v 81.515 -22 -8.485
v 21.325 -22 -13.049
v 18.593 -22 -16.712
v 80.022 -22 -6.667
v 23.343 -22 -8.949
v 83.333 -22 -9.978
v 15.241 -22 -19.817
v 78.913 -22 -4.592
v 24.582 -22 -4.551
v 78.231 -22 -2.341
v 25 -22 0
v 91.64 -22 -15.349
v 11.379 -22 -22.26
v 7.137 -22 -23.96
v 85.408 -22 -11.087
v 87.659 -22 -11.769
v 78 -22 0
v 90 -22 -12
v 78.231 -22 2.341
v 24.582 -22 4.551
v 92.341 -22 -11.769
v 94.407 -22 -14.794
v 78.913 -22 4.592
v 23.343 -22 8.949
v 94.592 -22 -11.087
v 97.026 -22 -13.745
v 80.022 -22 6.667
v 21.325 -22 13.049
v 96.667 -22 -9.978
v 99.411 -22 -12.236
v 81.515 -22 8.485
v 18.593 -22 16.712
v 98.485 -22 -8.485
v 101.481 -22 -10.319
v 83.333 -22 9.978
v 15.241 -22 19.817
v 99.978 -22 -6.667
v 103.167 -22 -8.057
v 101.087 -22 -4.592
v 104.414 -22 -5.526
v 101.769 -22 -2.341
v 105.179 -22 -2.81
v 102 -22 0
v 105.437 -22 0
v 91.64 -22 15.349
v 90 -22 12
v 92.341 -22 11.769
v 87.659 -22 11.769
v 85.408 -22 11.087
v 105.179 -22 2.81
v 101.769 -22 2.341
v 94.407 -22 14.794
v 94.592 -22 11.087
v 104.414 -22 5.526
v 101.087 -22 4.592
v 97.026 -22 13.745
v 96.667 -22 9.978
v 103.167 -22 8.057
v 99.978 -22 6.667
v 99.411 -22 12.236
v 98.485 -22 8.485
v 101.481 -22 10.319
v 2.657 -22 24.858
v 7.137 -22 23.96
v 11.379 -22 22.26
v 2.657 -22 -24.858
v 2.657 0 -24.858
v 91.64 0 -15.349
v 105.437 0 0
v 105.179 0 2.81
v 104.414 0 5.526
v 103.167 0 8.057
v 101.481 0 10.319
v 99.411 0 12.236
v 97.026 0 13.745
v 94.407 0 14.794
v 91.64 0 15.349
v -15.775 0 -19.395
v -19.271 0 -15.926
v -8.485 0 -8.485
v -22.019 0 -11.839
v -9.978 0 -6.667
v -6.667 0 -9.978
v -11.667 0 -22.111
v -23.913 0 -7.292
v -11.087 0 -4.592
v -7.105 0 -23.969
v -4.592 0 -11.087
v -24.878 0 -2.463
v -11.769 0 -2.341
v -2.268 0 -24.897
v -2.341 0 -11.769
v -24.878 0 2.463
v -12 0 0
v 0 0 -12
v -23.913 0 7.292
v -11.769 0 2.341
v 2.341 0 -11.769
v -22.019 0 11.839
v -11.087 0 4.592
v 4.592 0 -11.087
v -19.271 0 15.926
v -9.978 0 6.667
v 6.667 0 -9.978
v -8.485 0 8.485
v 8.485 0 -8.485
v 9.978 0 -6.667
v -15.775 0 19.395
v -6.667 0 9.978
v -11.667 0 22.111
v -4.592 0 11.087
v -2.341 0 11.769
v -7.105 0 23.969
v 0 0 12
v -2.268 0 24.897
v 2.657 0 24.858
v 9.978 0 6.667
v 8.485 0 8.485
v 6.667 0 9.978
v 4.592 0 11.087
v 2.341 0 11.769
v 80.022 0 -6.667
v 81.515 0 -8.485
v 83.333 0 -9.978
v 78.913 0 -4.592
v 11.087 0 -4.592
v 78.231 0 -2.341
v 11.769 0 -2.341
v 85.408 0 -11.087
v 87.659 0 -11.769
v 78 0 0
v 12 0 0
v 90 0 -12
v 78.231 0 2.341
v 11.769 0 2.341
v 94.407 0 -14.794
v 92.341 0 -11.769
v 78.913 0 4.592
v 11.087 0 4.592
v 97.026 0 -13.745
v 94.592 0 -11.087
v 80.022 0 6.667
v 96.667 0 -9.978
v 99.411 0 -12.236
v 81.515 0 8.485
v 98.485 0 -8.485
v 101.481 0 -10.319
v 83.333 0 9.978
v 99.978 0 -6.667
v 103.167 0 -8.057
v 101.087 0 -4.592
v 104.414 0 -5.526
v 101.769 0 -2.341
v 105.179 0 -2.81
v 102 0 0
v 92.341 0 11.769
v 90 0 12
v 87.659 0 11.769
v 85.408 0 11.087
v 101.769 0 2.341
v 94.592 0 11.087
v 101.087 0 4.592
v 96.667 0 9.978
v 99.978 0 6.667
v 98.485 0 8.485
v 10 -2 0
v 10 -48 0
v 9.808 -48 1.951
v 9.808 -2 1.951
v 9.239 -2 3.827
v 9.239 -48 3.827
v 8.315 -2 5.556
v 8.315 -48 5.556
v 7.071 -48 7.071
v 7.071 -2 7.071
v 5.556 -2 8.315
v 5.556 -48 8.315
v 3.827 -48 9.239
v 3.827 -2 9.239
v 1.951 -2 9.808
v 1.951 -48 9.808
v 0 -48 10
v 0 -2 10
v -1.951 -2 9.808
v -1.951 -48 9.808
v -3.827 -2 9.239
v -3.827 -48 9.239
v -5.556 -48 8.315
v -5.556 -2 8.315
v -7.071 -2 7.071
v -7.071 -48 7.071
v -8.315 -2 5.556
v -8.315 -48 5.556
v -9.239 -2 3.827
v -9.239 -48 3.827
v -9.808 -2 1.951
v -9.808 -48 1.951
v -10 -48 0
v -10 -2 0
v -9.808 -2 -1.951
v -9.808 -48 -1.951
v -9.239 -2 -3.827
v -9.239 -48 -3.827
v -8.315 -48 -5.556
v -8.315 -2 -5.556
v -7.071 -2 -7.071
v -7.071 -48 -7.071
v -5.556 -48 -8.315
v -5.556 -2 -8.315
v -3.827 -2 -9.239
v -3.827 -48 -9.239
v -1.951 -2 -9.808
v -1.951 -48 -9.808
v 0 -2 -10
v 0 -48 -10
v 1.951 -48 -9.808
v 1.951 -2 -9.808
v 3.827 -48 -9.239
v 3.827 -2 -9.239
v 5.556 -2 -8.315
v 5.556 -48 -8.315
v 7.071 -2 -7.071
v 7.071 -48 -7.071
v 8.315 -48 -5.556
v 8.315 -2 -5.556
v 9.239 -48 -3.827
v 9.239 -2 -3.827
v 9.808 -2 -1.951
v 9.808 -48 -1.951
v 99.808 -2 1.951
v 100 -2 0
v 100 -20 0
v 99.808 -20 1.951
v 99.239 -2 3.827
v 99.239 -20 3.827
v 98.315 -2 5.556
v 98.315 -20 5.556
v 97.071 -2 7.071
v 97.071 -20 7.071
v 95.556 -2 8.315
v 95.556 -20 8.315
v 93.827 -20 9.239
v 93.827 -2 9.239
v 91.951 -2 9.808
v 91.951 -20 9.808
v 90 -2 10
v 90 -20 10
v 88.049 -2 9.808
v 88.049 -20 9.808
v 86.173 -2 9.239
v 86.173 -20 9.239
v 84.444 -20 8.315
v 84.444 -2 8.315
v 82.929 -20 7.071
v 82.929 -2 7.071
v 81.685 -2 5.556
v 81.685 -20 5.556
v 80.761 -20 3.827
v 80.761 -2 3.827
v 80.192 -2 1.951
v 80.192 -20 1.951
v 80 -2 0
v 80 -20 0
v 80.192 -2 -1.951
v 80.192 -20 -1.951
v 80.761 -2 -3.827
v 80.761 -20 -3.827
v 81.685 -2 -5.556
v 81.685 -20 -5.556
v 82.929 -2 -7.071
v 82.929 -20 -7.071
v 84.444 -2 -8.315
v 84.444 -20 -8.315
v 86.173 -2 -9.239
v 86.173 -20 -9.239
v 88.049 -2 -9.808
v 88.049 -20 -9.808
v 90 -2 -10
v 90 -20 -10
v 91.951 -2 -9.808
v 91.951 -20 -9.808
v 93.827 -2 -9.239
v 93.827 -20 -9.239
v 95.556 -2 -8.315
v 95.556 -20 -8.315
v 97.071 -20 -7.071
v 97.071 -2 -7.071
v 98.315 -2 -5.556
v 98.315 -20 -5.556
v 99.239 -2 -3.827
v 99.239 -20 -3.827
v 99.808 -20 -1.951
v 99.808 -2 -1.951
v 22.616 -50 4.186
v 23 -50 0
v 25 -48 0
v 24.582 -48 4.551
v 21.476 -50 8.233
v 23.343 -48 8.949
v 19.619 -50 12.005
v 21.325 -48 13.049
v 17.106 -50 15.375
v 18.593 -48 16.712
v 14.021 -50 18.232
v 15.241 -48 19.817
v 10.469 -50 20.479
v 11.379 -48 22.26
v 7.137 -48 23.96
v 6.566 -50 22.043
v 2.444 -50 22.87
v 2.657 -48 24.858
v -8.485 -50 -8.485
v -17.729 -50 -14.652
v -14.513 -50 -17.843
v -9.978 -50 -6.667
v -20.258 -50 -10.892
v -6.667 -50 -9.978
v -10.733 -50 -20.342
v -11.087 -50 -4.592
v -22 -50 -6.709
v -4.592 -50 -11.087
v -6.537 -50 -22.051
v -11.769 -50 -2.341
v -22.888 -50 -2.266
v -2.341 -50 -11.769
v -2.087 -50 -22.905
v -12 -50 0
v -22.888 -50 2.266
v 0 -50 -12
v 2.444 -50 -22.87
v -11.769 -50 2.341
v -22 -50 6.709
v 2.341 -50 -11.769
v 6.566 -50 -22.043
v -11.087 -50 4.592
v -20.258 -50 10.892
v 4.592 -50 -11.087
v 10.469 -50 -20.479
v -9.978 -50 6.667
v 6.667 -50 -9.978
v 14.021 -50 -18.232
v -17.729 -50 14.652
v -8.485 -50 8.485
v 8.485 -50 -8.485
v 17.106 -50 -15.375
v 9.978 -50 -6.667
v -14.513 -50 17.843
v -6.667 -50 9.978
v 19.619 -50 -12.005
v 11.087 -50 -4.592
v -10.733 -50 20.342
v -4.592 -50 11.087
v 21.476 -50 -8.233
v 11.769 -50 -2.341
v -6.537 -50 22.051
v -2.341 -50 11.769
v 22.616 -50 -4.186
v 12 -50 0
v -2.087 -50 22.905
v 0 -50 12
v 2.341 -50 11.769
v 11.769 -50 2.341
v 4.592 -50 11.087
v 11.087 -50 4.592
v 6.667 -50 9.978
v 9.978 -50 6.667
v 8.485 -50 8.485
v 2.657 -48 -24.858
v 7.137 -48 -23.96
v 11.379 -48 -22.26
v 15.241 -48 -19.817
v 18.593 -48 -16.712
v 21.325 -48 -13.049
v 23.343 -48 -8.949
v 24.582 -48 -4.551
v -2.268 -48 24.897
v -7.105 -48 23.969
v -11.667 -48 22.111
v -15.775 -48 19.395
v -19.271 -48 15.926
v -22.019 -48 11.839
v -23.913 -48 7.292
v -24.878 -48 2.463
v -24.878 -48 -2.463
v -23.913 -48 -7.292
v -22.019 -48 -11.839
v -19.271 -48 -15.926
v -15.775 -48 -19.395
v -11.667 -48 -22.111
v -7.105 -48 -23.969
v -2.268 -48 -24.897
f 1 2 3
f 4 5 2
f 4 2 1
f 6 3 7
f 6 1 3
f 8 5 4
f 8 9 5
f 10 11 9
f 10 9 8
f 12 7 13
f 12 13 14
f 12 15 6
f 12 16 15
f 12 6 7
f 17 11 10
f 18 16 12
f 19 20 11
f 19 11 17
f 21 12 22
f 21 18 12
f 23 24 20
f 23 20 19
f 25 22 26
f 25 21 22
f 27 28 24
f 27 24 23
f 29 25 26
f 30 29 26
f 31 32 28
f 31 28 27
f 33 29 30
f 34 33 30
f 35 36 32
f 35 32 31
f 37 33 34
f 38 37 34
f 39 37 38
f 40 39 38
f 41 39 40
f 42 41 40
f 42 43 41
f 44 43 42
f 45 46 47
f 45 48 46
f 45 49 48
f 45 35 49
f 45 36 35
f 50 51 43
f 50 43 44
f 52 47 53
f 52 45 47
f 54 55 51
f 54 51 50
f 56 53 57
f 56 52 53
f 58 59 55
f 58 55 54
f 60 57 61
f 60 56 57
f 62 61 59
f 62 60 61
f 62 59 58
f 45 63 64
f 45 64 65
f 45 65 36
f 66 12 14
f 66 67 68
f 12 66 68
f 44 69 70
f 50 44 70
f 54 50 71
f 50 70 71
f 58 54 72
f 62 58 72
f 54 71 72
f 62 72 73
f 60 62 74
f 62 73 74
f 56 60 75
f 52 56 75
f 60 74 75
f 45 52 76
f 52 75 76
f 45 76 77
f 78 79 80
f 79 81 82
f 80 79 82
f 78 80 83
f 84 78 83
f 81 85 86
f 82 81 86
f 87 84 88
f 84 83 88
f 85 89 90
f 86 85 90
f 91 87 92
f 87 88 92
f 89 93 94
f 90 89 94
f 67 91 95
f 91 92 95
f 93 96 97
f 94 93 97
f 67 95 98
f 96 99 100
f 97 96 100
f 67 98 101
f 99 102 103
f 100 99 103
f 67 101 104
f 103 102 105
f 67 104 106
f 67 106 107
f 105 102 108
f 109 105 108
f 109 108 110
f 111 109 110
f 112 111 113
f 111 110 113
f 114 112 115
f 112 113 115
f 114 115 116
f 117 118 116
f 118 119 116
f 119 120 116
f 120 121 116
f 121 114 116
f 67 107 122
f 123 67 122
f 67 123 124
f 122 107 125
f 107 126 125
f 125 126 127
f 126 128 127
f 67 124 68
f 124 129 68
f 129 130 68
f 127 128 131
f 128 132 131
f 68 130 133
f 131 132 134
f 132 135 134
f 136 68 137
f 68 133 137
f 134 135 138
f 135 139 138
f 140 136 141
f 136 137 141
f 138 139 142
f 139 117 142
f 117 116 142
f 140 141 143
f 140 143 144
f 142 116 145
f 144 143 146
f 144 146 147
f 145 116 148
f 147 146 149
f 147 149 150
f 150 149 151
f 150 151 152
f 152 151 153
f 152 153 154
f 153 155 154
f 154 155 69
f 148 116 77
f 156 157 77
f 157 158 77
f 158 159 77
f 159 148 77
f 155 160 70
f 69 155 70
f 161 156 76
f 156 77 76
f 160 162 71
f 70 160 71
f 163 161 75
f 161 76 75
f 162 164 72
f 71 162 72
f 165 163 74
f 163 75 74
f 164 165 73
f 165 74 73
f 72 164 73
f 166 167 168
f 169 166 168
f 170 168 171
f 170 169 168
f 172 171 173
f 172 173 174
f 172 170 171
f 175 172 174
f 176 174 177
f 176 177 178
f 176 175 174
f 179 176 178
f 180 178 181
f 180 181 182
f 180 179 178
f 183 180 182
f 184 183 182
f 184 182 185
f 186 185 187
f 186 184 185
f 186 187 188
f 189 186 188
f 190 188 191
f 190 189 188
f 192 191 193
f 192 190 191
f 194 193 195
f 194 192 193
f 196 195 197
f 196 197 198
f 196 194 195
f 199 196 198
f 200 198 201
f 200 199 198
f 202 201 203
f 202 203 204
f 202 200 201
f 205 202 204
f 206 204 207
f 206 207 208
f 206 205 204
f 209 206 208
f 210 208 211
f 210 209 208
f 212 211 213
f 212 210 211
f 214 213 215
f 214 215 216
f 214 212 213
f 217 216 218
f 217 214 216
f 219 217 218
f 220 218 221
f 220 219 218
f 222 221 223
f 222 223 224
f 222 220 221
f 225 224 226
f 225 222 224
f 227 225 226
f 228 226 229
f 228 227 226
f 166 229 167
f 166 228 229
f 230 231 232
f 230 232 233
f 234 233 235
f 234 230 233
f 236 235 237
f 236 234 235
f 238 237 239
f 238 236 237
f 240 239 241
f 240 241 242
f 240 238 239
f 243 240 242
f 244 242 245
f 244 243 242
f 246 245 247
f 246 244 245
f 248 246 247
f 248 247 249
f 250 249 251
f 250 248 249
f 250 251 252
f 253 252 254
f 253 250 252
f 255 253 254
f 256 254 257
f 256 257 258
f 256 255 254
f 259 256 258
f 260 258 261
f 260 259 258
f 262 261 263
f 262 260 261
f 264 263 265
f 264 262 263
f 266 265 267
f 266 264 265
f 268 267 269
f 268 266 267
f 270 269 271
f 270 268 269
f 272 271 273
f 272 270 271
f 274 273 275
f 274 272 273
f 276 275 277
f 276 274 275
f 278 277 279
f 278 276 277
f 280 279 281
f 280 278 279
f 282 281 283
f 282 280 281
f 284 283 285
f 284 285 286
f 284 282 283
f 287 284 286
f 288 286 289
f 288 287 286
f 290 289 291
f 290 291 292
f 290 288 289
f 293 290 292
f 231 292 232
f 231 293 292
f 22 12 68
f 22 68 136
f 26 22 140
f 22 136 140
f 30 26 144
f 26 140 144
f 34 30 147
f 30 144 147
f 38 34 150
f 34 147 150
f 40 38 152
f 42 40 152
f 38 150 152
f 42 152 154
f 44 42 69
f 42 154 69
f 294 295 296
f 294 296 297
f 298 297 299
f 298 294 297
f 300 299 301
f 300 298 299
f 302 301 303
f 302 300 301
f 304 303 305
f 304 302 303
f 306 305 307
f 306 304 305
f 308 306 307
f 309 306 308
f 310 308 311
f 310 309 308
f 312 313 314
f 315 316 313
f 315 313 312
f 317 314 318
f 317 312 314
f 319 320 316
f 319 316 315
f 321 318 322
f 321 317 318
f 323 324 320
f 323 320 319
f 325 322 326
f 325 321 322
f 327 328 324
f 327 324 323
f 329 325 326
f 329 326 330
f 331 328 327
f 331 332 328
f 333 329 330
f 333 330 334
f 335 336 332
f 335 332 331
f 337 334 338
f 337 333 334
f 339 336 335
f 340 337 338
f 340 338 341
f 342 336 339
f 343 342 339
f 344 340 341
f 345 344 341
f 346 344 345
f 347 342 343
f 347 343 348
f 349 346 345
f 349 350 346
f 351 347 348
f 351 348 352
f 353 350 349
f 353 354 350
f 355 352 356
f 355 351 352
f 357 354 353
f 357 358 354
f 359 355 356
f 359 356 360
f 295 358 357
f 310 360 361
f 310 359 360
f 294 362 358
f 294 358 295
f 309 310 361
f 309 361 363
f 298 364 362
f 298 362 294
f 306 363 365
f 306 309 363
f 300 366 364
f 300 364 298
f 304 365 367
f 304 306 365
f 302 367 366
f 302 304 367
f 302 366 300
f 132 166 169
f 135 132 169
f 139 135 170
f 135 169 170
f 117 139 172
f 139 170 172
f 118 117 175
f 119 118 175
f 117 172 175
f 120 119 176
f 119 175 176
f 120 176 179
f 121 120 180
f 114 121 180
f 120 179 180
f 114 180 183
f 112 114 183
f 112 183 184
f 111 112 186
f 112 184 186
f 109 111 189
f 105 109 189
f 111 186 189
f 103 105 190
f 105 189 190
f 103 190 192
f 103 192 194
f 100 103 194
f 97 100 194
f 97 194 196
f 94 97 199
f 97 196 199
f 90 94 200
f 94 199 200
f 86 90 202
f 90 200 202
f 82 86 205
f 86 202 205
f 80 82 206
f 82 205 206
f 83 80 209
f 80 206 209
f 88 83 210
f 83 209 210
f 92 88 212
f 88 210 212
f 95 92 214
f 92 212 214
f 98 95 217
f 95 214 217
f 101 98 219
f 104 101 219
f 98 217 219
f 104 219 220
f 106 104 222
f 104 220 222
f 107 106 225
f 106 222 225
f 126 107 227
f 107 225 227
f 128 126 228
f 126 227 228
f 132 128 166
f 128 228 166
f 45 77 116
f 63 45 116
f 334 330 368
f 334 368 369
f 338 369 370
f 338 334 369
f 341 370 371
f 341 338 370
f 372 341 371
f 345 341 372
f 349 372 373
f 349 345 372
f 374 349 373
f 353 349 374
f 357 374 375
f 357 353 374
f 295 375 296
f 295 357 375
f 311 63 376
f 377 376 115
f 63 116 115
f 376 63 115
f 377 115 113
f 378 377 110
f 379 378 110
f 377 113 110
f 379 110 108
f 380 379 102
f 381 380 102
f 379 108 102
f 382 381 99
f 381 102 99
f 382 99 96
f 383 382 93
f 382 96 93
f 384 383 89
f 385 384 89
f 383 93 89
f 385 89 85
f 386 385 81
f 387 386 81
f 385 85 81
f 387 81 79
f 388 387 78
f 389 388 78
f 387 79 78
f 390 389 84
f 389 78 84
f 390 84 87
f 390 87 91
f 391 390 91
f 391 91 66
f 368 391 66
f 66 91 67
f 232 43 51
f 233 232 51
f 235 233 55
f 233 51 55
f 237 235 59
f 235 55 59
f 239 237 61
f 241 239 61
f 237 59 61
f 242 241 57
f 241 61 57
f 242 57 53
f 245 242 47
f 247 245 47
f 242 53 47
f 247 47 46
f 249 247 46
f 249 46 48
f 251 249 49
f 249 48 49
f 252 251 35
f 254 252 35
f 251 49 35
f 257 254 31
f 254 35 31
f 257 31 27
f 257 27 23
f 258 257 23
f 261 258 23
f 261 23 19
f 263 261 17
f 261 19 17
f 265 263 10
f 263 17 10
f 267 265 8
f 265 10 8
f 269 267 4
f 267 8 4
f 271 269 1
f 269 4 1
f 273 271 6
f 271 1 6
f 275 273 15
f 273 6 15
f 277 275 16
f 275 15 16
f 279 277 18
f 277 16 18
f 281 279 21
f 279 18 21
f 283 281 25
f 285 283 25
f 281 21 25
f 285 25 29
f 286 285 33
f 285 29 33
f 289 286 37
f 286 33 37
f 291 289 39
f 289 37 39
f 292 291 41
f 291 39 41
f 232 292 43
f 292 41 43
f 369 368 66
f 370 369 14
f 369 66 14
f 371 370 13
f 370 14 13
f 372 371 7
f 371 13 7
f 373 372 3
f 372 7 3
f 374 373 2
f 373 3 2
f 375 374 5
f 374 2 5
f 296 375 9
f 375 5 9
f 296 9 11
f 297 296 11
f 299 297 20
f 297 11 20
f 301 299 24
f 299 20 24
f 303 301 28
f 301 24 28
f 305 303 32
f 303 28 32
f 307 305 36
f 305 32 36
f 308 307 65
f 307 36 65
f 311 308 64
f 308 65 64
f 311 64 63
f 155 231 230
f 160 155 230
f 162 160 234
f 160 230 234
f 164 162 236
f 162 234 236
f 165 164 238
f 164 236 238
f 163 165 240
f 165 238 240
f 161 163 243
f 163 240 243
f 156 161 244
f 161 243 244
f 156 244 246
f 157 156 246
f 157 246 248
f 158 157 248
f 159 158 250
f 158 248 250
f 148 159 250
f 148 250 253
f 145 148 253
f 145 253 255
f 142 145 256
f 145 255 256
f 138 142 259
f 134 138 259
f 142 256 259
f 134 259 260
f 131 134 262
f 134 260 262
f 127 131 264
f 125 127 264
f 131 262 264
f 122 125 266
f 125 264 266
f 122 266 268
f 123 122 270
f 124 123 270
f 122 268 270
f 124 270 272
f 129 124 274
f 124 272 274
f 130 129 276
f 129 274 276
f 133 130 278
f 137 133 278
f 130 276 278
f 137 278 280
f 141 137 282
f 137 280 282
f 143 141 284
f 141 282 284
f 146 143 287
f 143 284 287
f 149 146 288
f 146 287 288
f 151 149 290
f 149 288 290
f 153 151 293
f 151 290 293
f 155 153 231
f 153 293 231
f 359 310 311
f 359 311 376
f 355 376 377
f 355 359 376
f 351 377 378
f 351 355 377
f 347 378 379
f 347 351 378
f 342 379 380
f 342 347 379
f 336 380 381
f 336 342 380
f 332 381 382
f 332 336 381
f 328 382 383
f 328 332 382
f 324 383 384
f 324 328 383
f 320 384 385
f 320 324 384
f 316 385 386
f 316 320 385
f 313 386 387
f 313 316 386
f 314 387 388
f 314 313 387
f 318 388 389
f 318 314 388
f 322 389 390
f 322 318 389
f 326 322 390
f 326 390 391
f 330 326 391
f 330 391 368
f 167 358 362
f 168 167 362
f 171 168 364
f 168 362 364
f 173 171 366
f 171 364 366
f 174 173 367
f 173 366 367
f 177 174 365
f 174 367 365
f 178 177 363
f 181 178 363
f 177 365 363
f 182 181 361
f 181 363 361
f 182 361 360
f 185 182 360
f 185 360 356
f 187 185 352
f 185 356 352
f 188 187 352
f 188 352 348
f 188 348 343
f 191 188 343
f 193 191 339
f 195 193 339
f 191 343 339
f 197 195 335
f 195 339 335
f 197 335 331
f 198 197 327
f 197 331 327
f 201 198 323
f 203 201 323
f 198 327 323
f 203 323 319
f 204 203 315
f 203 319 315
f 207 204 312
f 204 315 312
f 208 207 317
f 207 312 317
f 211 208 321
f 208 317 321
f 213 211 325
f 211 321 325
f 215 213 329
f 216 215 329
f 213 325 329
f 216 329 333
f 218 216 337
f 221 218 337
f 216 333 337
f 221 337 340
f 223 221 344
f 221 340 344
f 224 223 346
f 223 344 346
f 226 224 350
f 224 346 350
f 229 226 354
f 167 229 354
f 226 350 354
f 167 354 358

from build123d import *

# Parameters (mm, degrees)
F0_R     = 10
F2_DEPTH = 22
F3_DEPTH = 50
F4_SIZE  = 2


with BuildPart() as f2:
    # F0 (on Front) → F2 (new body)
    with BuildSketch(Plane.XZ):
        with BuildLine():
            ThreePointArc((2.656511, -24.858458), (18.593181, -16.71208), (25, 0))
            ThreePointArc((25, 0), (18.593181, 16.71208), (2.656511, 24.858458))
            ThreePointArc((2.656511, 24.858458), (-25, 0), (2.656511, -24.858458))
        make_face()
        Circle(F0_R, mode=Mode.SUBTRACT)
        with BuildLine():
            ThreePointArc((2.656511, 24.858458), (18.593181, 16.71208), (25, 0))
            ThreePointArc((25, 0), (18.593181, -16.71208), (2.656511, -24.858458))
            Line((2.656511, -24.858458), (91.640296, -15.349164))
            ThreePointArc((91.640296, -15.349164), (74.563439, 0), (91.640296, 15.349164))
            Line((91.640296, 15.349164), (2.656511, 24.858458))
        make_face()
        with BuildLine():
            ThreePointArc((105.436561, 0), (101.480591, 10.319081), (91.640296, 15.349164))
            ThreePointArc((91.640296, 15.349164), (74.563439, 0), (91.640296, -15.349164))
            ThreePointArc((91.640296, -15.349164), (101.480591, -10.319081), (105.436561, 0))
        make_face()
        with Locations((90, 0)):
            Circle(F0_R, mode=Mode.SUBTRACT)
    extrude(amount=F2_DEPTH)

    # F0 (on Front) → F3 (join)
    with BuildSketch(Plane.XZ):
        with BuildLine():
            ThreePointArc((2.656511, -24.858458), (18.593181, -16.71208), (25, 0))
            ThreePointArc((25, 0), (18.593181, 16.71208), (2.656511, 24.858458))
            ThreePointArc((2.656511, 24.858458), (-25, 0), (2.656511, -24.858458))
        make_face()
        Circle(F0_R, mode=Mode.SUBTRACT)
    extrude(amount=F3_DEPTH)

    # F4
    f4_edges = [f2.edges().sort_by_distance(p)[0] for p in [
        (80, -22, 0),
        (-10, -50, 0),
        (-2.656511, -50, 24.858458),
        (80, 0, 0),
        (-10, 0, 0),
    ]]
    chamfer(f4_edges, length=F4_SIZE)


solid = f2.part
